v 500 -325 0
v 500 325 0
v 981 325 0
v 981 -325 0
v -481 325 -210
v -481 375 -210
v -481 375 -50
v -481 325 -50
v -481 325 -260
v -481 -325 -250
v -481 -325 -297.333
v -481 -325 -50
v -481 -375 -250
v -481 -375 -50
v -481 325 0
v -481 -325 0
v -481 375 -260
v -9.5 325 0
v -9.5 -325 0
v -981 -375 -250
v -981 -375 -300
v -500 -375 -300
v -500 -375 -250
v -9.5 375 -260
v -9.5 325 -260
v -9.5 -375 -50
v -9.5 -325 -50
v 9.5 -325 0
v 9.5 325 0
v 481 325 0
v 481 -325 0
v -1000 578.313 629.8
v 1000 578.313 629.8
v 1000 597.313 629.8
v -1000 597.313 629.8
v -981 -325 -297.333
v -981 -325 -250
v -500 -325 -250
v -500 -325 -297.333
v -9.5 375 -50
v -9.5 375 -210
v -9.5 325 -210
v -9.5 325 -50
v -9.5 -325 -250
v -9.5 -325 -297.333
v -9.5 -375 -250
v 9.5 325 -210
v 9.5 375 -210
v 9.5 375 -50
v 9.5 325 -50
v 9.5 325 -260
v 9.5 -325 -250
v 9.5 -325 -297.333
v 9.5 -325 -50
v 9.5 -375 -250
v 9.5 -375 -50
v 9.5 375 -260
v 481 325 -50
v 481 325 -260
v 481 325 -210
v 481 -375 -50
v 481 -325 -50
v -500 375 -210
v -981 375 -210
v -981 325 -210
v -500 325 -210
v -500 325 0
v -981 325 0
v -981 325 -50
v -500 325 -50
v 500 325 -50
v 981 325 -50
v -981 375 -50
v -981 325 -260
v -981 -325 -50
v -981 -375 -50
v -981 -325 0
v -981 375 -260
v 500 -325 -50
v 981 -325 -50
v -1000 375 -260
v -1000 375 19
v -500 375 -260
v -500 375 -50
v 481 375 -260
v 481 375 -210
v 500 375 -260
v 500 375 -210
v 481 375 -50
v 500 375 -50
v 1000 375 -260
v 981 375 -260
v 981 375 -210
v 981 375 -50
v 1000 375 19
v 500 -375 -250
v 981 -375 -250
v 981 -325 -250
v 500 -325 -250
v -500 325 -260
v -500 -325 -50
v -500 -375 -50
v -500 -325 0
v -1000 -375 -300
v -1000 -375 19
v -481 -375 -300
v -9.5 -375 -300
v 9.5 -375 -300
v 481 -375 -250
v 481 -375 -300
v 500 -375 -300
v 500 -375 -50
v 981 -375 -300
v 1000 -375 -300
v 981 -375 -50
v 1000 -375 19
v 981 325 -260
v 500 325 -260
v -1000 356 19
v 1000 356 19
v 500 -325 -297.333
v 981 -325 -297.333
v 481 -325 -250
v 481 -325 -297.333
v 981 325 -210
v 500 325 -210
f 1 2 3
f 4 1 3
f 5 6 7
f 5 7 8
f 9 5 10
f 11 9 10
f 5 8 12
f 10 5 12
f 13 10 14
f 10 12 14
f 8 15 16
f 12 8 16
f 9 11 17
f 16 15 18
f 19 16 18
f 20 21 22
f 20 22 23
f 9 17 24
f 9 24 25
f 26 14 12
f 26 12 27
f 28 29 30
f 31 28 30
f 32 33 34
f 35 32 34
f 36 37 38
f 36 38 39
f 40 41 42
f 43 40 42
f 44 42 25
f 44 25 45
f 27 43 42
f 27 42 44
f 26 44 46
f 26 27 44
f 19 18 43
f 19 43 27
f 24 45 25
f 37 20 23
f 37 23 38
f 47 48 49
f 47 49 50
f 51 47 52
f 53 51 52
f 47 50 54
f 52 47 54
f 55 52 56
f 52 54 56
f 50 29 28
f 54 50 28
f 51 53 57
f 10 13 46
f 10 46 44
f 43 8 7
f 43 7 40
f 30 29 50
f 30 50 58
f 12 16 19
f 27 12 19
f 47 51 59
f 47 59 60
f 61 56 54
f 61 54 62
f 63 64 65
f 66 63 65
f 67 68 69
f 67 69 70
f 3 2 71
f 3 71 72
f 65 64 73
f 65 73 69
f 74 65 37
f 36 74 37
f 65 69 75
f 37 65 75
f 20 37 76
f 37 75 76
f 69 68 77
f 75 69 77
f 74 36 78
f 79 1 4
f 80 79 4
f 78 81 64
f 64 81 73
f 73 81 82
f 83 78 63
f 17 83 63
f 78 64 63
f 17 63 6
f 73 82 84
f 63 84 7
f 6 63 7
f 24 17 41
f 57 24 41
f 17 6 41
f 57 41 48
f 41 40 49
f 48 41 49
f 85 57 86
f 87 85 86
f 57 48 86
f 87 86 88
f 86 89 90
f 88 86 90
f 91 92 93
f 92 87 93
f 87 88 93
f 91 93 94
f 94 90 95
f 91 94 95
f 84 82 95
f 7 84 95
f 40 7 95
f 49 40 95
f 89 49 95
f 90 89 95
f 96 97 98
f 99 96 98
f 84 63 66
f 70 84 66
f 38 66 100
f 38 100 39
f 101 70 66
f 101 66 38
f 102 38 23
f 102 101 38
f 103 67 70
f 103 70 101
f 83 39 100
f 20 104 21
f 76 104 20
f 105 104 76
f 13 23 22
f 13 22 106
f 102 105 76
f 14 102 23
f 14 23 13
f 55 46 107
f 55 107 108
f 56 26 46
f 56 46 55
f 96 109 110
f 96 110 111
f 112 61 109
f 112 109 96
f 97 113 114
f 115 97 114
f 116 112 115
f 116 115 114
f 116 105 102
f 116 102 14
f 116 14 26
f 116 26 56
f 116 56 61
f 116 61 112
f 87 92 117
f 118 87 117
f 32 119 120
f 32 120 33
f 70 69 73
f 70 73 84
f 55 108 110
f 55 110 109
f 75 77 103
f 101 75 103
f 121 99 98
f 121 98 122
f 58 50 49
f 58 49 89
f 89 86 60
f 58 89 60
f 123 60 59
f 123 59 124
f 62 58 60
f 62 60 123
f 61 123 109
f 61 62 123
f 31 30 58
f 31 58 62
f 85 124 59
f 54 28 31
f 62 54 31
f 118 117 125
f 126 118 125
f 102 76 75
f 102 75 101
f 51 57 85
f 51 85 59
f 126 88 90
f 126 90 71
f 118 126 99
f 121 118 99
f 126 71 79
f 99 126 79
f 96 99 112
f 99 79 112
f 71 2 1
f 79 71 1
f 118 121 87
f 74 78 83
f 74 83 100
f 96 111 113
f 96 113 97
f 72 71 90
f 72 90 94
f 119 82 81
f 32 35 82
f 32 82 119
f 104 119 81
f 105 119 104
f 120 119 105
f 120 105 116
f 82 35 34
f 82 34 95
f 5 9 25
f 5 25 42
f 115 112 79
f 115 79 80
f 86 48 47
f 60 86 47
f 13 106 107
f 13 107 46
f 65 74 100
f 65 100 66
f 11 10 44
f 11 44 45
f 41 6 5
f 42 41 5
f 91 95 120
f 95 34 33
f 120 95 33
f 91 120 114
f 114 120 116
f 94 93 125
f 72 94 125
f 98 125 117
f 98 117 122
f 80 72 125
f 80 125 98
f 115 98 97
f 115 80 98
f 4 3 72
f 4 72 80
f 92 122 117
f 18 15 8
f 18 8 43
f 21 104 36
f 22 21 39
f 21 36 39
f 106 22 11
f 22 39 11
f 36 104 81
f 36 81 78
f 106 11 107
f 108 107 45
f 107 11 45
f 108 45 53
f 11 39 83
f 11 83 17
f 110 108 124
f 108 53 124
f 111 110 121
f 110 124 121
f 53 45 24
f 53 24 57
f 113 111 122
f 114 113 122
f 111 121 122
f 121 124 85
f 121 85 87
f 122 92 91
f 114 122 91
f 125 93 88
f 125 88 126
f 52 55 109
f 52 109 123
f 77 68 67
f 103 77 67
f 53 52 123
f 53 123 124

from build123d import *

# Parameters (mm, degrees)
F0_W       = 2000
F0_H       = 750
F1_DEPTH   = 19
F2_W       = 19
F2_H       = 750
F3_DEPTH   = 300
F4_SIZE2   = 39.99999
F4_SIZE    = 749.99999
F4_2_SIZE2 = 39.99999
F4_2_SIZE  = 749.99999
F4_3_SIZE2 = 39.99999
F4_3_SIZE  = 749.99999
F4_4_SIZE2 = 39.99999
F4_4_SIZE  = 749.99999
F4_5_SIZE2 = 39.99999
F4_5_SIZE  = 749.99999
F6_DEPTH   = 2000
F10_W      = 481
F10_H      = 50
F9_W       = 471.5
F9_H       = 50
F8_W       = 471.5
F8_H       = 50
F7_W       = 481
F7_H       = 50
F11_DEPTH  = 50
F12_W      = 50
F12_H      = 50
F13_DEPTH  = 2000


# Not quite as in the source:
# - a fillet or chamfer is up to 0.001 mm smaller than in the source, because OpenCascade refuses the exact size
# - ends of sketch curves that miss each other by under 0.0002 mm in the source are joined


with BuildPart() as f1:
    # F0 (on Top) → F1 (new body)
    with BuildSketch(Plane.XY):
        Rectangle(F0_W, F0_H)
    extrude(amount=F1_DEPTH)

    # F2 (on face) → F3 (join)
    with BuildSketch(Plane(origin=(0, 0, 0), x_dir=(1, 0, 0), z_dir=(0, 0, -1))):
        with Locations((-990.5, 0)):
            Rectangle(F2_W, F2_H)
        with Locations((-490.5, 0)):
            Rectangle(F2_W, F2_H)
        Rectangle(F2_W, F2_H)
        with Locations((490.5, 0)):
            Rectangle(F2_W, F2_H)
        with Locations((990.5, 0)):
            Rectangle(F2_W, F2_H)
    extrude(amount=F3_DEPTH)

    # F4 (size 750 and 40 in the source; OpenCascade refuses exactly that, so slightly less here)
    f4_edges = [f1.edges().sort_by_distance(p)[0] for p in [
        (990.5, 375, -300),
    ]]
    f4_side = f1.faces().sort_by_distance((990.5, 0, -300))[0]
    chamfer(f4_edges, length=F4_SIZE, length2=F4_SIZE2, reference=f4_side)

    # F4#2 (size 750 and 40 in the source; OpenCascade refuses exactly that, so slightly less here)
    f4_2_edges = [f1.edges().sort_by_distance(p)[0] for p in [
        (490.5, 375, -300),
    ]]
    f4_2_side = f1.faces().sort_by_distance((490.5, 0, -300))[0]
    chamfer(f4_2_edges, length=F4_2_SIZE, length2=F4_2_SIZE2, reference=f4_2_side)

    # F4#3 (size 750 and 40 in the source; OpenCascade refuses exactly that, so slightly less here)
    f4_3_edges = [f1.edges().sort_by_distance(p)[0] for p in [
        (0, 375, -300),
    ]]
    f4_3_side = f1.faces().sort_by_distance((0, 0, -300))[0]
    chamfer(f4_3_edges, length=F4_3_SIZE, length2=F4_3_SIZE2, reference=f4_3_side)

    # F4#4 (size 750 and 40 in the source; OpenCascade refuses exactly that, so slightly less here)
    f4_4_edges = [f1.edges().sort_by_distance(p)[0] for p in [
        (-490.5, 375, -300),
    ]]
    f4_4_side = f1.faces().sort_by_distance((-490.5, 0, -300))[0]
    chamfer(f4_4_edges, length=F4_4_SIZE, length2=F4_4_SIZE2, reference=f4_4_side)

    # F4#5 (size 750 and 40 in the source; OpenCascade refuses exactly that, so slightly less here)
    f4_5_edges = [f1.edges().sort_by_distance(p)[0] for p in [
        (-990.5, 375, -300),
    ]]
    f4_5_side = f1.faces().sort_by_distance((-990.5, 0, -300))[0]
    chamfer(f4_5_edges, length=F4_5_SIZE, length2=F4_5_SIZE2, reference=f4_5_side)

    # F5 (on face) → F6 (join)
    with BuildSketch(Plane(origin=(-1000, 0, 0), x_dir=(0, -1, 0), z_dir=(-1, 0, 0))):
        Polygon((-597.3130931617, 629.8002035108), (-375, 19), (-356, 19), (-578.3130931617, 629.8002035108), align=None)
    extrude(amount=-F6_DEPTH)

    # F10 (on face) + F9 (on face) + F8 (on face) + F7 (on face) → F11 (join)
    with BuildSketch(Plane(origin=(0, 0, 0), x_dir=(1, 0, 0), z_dir=(0, 0, -1))):
        with Locations((-740.5, 350)):
            Rectangle(F10_W, F10_H)
        with Locations((-740.5, -350)):
            Rectangle(F10_W, F10_H)
    with BuildSketch(Plane(origin=(0, 0, 0), x_dir=(1, 0, 0), z_dir=(0, 0, -1))):
        with Locations((-245.25, -350)):
            Rectangle(F9_W, F9_H)
        with Locations((-245.25, 350)):
            Rectangle(F9_W, F9_H)
    with BuildSketch(Plane(origin=(0, 0, 0), x_dir=(1, 0, 0), z_dir=(0, 0, -1))):
        with Locations((245.25, 350)):
            Rectangle(F8_W, F8_H)
        with Locations((245.25, -350)):
            Rectangle(F8_W, F8_H)
    with BuildSketch(Plane(origin=(0, 0, 0), x_dir=(1, 0, 0), z_dir=(0, 0, -1))):
        with Locations((740.5, 350)):
            Rectangle(F7_W, F7_H)
        with Locations((740.5, -350)):
            Rectangle(F7_W, F7_H)
    extrude(amount=F11_DEPTH)

    # F12 (on face) → F13 (join)
    with BuildSketch(Plane(origin=(-1000, 0, 0), x_dir=(0, -1, 0), z_dir=(-1, 0, 0))):
        with Locations((-350, -235)):
            Rectangle(F12_W, F12_H)
        Polygon((325, -250), (325, -297.3333344978), (374.99999, -300), (375, -250), align=None)
    extrude(amount=-F13_DEPTH)


solid = f1.part
